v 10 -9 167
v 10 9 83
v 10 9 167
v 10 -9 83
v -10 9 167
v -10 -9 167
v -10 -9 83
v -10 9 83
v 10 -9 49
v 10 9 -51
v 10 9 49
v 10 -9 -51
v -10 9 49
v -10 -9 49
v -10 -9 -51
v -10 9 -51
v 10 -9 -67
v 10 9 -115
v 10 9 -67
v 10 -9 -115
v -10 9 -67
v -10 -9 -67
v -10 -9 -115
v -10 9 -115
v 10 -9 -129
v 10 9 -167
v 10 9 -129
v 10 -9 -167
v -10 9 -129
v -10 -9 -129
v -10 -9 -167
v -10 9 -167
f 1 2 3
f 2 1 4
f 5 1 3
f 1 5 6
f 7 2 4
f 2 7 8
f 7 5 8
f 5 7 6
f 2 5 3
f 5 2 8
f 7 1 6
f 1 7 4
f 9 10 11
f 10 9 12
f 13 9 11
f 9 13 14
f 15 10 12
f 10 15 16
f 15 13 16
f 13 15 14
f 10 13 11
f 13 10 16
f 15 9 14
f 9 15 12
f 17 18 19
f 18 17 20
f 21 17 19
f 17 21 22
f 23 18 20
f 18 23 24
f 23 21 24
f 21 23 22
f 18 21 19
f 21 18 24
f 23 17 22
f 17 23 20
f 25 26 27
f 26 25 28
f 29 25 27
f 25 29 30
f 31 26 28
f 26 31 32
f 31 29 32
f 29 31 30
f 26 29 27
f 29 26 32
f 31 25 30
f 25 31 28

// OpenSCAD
// ============================================================================
// Atom Lithography Machine — Parametric OpenSCAD Module (S6.5-03)
// ============================================================================
// part_id           : S6.5-03
// parent_bom_id     : S6.5
// subsystem         : S6
// part_name         : Kriyojenik RF koaksiyel hatlar, bias-tee ve Eccosorb dusuk-geciren filtreler
// material          : CuNi
// temp_stage        : 300 K -> 20 mK
// vacuum_grade      : Kriyo-vakum
// tolerance         : ISO 2768-mK
// computed_mass_kg  : 0.20742
// envelope_mm       : 20.000 x 18.000 x 334.000
// design_maturity   : M0_M1_DETAILED_CAD_DESIGN_ONLY
// no_lab_measurement: true
// iec61508_certified: false
// semi_s2_certified : false
// Units: millimeters (mm)
// ============================================================================

$fn = 64;

// Nominal bounding envelope parameters (mm)
bbox_x = 20.0000;
bbox_y = 18.0000;
bbox_z = 334.0000;

// Part-specific parametric dimensions
n_lines = 8;
eccosorb_grade = "CR-124";
ir_atten_db = 40.0;

// Interface / port parameters (mm)

module part_S6_5_03() {
  union() {
    // Stage 50k_4k thermalized cryo coax loom (8 lines)
    translate([0.000, 0.000, 125.000]) cube([20.000, 18.000, 84.000], center=true);
    // Stage 4k_still thermalized cryo coax loom (8 lines)
    translate([0.000, 0.000, -1.000]) cube([20.000, 18.000, 100.000], center=true);
    // Stage still_cp thermalized cryo coax loom (8 lines)
    translate([0.000, 0.000, -91.000]) cube([20.000, 18.000, 48.000], center=true);
    // Stage cp_mxc thermalized cryo coax loom (8 lines)
    translate([0.000, 0.000, -148.000]) cube([20.000, 18.000, 38.000], center=true);
  }
}

// World assembly mounting transform (global machine frame, mm / deg):
// translate([-588.000, -40.000, 669.000]) rotate([0.000, 0.000, 0.000]) part_S6_5_03();

part_S6_5_03();
